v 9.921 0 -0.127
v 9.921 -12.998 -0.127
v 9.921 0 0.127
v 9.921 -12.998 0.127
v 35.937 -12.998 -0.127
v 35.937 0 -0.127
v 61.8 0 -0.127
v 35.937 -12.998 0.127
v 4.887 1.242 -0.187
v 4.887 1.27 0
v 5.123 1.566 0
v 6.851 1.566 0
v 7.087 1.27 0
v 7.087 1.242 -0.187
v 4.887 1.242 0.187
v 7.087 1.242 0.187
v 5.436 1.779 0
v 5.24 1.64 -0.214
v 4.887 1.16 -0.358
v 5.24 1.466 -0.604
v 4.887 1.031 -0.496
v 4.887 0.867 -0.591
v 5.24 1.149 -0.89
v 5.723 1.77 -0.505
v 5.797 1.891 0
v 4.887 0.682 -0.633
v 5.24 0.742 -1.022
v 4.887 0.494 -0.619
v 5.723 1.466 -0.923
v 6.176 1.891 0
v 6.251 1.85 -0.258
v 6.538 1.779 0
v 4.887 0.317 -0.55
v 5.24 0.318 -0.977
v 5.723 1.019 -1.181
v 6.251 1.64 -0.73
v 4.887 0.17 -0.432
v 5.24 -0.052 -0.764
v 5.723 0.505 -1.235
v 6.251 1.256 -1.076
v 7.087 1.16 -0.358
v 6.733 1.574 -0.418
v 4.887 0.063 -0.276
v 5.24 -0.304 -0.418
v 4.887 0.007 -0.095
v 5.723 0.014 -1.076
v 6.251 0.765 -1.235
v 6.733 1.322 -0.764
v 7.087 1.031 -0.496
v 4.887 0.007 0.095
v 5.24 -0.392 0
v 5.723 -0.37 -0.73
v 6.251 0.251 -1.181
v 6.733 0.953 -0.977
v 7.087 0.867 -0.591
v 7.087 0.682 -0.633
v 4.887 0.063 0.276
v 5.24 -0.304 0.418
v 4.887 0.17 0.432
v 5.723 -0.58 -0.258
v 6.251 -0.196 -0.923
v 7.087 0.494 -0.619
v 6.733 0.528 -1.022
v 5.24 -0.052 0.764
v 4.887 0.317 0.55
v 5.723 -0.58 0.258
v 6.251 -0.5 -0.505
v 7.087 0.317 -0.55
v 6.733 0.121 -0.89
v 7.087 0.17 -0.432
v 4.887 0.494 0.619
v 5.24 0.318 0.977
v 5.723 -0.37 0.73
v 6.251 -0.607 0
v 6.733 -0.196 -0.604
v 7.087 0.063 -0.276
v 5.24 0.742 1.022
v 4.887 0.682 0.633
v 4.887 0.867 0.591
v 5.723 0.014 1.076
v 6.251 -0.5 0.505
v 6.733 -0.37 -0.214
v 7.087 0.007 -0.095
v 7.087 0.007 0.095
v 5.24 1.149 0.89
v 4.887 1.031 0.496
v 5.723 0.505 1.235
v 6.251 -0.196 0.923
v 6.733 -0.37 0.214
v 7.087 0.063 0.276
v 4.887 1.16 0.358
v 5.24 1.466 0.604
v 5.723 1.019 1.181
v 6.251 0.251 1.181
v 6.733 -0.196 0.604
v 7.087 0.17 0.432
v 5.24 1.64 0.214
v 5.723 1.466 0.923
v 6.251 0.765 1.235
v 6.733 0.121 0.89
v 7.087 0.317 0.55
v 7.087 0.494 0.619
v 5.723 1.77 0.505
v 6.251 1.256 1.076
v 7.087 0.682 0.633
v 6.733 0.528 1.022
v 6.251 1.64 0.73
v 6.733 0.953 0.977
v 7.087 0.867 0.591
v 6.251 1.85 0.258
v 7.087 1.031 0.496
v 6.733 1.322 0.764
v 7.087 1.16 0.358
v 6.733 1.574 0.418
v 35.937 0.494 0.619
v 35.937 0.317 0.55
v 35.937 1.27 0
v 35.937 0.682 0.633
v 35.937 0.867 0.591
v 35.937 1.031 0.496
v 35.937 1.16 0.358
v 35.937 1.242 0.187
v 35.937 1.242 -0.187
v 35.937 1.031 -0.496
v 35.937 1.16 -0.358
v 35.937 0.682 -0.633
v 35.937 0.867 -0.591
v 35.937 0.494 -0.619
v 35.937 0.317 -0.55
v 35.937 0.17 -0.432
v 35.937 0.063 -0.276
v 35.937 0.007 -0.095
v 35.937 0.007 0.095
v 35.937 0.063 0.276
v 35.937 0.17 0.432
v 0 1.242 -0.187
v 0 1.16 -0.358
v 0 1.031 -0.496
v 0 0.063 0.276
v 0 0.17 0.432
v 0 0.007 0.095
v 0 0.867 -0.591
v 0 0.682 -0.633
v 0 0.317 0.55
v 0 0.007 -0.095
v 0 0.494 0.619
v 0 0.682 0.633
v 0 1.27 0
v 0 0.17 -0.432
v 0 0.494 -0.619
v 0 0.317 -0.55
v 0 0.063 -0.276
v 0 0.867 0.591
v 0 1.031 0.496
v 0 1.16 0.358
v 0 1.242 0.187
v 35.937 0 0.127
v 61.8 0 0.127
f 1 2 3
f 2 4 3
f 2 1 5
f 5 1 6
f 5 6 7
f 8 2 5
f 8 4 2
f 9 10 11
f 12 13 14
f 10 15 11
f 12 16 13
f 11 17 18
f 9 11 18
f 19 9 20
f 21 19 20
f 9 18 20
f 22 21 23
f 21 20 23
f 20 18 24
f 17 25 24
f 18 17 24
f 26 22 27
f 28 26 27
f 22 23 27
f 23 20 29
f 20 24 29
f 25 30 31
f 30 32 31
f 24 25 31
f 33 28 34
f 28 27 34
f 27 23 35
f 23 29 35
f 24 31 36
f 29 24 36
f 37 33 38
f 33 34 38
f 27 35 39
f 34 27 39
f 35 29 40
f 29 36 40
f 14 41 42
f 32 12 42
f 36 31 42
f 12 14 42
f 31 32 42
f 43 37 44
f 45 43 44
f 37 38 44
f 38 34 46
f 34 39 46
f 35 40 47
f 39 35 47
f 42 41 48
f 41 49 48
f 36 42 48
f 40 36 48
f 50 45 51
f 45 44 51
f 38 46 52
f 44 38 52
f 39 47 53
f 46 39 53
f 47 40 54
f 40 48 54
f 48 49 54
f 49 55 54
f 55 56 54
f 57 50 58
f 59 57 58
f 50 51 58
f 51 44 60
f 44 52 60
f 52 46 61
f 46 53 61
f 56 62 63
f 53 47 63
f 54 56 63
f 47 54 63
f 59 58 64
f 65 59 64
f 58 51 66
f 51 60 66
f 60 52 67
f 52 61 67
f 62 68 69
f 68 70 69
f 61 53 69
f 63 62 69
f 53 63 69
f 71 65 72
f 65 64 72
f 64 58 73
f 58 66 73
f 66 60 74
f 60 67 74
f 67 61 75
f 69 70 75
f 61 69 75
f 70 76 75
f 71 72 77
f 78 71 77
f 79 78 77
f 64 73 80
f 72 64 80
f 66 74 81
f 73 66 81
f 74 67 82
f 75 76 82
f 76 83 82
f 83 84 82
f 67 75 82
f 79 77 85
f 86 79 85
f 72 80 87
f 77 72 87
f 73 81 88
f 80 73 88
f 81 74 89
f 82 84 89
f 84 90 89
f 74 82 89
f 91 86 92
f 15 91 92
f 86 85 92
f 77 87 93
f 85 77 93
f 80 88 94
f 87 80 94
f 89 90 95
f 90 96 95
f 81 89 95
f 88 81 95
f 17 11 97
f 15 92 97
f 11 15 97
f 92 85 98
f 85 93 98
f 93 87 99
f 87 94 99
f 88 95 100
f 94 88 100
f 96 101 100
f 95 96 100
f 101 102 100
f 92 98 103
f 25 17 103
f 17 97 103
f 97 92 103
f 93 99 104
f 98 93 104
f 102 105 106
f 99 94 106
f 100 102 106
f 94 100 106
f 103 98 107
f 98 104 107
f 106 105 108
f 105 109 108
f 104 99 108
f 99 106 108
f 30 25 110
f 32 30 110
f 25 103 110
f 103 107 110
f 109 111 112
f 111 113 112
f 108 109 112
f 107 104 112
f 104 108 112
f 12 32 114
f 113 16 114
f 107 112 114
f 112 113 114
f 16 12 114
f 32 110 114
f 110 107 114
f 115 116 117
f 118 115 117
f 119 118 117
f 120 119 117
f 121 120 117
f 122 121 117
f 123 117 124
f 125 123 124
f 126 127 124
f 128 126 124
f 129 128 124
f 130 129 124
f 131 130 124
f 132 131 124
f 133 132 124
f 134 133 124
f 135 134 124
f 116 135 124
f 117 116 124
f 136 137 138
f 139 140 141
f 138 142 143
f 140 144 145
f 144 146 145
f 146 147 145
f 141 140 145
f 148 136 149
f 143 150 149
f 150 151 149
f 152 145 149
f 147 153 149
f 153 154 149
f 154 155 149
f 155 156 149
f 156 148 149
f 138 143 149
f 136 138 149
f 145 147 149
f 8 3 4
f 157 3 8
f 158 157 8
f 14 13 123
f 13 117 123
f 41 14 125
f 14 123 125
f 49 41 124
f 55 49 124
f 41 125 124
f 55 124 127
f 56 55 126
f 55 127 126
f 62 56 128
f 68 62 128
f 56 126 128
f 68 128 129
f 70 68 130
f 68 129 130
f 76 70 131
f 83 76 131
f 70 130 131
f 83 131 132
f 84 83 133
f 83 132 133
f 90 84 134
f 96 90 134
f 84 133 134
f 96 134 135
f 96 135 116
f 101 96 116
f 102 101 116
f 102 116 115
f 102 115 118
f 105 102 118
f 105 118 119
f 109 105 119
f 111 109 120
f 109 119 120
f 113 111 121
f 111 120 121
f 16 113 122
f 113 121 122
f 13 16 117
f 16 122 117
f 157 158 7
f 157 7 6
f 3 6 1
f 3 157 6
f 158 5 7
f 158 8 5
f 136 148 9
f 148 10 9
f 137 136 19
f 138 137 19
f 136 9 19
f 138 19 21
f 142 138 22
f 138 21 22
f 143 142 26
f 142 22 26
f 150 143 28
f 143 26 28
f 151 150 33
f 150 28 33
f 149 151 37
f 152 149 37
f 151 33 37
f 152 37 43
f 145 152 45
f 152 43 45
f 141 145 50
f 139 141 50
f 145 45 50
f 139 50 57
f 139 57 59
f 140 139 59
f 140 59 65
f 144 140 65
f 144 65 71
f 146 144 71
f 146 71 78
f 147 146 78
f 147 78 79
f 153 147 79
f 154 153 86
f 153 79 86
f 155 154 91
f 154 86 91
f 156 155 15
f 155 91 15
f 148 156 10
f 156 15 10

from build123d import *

# Parameters (mm, degrees)
SKETCH2_W           = 26.015295186
SKETCH2_H           = 12.997707743
BOSS_EXTRUDE1_DEPTH = 0.127


with BuildPart() as part:
    # Sketch1 → Revolve1 (revolve)
    with BuildSketch(Plane.XY, mode=Mode.PRIVATE) as revolve1_sk:
        with BuildLine():
            Line((7.086533119, 0), (4.886828594, 0))
            ThreePointArc((4.886828594, 0), (5.986680857, -0.635), (7.086533119, 0))
        make_face()
        with BuildLine():
            ThreePointArc((4.716680857, 0.635), (4.759955057, 0.306299813), (4.886828594, 0))
            Line((4.886828594, 0), (7.086533119, 0))
            ThreePointArc((7.086533119, 0), (7.213406656, 0.306299813), (7.256680857, 0.635))
            Line((7.256680857, 0.635), (4.716680857, 0.635))
        make_face()
        with BuildLine():
            Line((0, 0.635), (0, 0))
            Line((0, 0), (4.886828594, 0))
            ThreePointArc((4.886828594, 0), (4.759955057, 0.306299813), (4.716680857, 0.635))
            Line((4.716680857, 0.635), (0, 0.635))
        make_face()
        with BuildLine():
            ThreePointArc((7.256680857, 0.635), (7.213406656, 0.306299813), (7.086533119, 0))
            Line((7.086533119, 0), (35.936514965, 0))
            Line((35.936514965, 0), (35.936514965, 0.635))
            Line((35.936514965, 0.635), (7.256680857, 0.635))
        make_face()
    revolve(revolve1_sk.sketch.rotate(Axis((35.936514965, 0.635, 0), (-1, 0, 0)), 180), axis=Axis((35.936514965, 0.635, 0), (-1, 0, 0)))


with BuildPart() as body_2:
    # Sketch2 → Boss-Extrude1 (new, symmetric)
    with BuildSketch(Plane.XY):
        Polygon((35.936514965, -12.997707743), (61.800281192, 0), (35.936514965, 0), align=None)
        with Locations((22.928867372, -6.498853872)):
            Rectangle(SKETCH2_W, SKETCH2_H)
    extrude(amount=BOSS_EXTRUDE1_DEPTH, both=True)


solid = Compound([part.part, body_2.part])
